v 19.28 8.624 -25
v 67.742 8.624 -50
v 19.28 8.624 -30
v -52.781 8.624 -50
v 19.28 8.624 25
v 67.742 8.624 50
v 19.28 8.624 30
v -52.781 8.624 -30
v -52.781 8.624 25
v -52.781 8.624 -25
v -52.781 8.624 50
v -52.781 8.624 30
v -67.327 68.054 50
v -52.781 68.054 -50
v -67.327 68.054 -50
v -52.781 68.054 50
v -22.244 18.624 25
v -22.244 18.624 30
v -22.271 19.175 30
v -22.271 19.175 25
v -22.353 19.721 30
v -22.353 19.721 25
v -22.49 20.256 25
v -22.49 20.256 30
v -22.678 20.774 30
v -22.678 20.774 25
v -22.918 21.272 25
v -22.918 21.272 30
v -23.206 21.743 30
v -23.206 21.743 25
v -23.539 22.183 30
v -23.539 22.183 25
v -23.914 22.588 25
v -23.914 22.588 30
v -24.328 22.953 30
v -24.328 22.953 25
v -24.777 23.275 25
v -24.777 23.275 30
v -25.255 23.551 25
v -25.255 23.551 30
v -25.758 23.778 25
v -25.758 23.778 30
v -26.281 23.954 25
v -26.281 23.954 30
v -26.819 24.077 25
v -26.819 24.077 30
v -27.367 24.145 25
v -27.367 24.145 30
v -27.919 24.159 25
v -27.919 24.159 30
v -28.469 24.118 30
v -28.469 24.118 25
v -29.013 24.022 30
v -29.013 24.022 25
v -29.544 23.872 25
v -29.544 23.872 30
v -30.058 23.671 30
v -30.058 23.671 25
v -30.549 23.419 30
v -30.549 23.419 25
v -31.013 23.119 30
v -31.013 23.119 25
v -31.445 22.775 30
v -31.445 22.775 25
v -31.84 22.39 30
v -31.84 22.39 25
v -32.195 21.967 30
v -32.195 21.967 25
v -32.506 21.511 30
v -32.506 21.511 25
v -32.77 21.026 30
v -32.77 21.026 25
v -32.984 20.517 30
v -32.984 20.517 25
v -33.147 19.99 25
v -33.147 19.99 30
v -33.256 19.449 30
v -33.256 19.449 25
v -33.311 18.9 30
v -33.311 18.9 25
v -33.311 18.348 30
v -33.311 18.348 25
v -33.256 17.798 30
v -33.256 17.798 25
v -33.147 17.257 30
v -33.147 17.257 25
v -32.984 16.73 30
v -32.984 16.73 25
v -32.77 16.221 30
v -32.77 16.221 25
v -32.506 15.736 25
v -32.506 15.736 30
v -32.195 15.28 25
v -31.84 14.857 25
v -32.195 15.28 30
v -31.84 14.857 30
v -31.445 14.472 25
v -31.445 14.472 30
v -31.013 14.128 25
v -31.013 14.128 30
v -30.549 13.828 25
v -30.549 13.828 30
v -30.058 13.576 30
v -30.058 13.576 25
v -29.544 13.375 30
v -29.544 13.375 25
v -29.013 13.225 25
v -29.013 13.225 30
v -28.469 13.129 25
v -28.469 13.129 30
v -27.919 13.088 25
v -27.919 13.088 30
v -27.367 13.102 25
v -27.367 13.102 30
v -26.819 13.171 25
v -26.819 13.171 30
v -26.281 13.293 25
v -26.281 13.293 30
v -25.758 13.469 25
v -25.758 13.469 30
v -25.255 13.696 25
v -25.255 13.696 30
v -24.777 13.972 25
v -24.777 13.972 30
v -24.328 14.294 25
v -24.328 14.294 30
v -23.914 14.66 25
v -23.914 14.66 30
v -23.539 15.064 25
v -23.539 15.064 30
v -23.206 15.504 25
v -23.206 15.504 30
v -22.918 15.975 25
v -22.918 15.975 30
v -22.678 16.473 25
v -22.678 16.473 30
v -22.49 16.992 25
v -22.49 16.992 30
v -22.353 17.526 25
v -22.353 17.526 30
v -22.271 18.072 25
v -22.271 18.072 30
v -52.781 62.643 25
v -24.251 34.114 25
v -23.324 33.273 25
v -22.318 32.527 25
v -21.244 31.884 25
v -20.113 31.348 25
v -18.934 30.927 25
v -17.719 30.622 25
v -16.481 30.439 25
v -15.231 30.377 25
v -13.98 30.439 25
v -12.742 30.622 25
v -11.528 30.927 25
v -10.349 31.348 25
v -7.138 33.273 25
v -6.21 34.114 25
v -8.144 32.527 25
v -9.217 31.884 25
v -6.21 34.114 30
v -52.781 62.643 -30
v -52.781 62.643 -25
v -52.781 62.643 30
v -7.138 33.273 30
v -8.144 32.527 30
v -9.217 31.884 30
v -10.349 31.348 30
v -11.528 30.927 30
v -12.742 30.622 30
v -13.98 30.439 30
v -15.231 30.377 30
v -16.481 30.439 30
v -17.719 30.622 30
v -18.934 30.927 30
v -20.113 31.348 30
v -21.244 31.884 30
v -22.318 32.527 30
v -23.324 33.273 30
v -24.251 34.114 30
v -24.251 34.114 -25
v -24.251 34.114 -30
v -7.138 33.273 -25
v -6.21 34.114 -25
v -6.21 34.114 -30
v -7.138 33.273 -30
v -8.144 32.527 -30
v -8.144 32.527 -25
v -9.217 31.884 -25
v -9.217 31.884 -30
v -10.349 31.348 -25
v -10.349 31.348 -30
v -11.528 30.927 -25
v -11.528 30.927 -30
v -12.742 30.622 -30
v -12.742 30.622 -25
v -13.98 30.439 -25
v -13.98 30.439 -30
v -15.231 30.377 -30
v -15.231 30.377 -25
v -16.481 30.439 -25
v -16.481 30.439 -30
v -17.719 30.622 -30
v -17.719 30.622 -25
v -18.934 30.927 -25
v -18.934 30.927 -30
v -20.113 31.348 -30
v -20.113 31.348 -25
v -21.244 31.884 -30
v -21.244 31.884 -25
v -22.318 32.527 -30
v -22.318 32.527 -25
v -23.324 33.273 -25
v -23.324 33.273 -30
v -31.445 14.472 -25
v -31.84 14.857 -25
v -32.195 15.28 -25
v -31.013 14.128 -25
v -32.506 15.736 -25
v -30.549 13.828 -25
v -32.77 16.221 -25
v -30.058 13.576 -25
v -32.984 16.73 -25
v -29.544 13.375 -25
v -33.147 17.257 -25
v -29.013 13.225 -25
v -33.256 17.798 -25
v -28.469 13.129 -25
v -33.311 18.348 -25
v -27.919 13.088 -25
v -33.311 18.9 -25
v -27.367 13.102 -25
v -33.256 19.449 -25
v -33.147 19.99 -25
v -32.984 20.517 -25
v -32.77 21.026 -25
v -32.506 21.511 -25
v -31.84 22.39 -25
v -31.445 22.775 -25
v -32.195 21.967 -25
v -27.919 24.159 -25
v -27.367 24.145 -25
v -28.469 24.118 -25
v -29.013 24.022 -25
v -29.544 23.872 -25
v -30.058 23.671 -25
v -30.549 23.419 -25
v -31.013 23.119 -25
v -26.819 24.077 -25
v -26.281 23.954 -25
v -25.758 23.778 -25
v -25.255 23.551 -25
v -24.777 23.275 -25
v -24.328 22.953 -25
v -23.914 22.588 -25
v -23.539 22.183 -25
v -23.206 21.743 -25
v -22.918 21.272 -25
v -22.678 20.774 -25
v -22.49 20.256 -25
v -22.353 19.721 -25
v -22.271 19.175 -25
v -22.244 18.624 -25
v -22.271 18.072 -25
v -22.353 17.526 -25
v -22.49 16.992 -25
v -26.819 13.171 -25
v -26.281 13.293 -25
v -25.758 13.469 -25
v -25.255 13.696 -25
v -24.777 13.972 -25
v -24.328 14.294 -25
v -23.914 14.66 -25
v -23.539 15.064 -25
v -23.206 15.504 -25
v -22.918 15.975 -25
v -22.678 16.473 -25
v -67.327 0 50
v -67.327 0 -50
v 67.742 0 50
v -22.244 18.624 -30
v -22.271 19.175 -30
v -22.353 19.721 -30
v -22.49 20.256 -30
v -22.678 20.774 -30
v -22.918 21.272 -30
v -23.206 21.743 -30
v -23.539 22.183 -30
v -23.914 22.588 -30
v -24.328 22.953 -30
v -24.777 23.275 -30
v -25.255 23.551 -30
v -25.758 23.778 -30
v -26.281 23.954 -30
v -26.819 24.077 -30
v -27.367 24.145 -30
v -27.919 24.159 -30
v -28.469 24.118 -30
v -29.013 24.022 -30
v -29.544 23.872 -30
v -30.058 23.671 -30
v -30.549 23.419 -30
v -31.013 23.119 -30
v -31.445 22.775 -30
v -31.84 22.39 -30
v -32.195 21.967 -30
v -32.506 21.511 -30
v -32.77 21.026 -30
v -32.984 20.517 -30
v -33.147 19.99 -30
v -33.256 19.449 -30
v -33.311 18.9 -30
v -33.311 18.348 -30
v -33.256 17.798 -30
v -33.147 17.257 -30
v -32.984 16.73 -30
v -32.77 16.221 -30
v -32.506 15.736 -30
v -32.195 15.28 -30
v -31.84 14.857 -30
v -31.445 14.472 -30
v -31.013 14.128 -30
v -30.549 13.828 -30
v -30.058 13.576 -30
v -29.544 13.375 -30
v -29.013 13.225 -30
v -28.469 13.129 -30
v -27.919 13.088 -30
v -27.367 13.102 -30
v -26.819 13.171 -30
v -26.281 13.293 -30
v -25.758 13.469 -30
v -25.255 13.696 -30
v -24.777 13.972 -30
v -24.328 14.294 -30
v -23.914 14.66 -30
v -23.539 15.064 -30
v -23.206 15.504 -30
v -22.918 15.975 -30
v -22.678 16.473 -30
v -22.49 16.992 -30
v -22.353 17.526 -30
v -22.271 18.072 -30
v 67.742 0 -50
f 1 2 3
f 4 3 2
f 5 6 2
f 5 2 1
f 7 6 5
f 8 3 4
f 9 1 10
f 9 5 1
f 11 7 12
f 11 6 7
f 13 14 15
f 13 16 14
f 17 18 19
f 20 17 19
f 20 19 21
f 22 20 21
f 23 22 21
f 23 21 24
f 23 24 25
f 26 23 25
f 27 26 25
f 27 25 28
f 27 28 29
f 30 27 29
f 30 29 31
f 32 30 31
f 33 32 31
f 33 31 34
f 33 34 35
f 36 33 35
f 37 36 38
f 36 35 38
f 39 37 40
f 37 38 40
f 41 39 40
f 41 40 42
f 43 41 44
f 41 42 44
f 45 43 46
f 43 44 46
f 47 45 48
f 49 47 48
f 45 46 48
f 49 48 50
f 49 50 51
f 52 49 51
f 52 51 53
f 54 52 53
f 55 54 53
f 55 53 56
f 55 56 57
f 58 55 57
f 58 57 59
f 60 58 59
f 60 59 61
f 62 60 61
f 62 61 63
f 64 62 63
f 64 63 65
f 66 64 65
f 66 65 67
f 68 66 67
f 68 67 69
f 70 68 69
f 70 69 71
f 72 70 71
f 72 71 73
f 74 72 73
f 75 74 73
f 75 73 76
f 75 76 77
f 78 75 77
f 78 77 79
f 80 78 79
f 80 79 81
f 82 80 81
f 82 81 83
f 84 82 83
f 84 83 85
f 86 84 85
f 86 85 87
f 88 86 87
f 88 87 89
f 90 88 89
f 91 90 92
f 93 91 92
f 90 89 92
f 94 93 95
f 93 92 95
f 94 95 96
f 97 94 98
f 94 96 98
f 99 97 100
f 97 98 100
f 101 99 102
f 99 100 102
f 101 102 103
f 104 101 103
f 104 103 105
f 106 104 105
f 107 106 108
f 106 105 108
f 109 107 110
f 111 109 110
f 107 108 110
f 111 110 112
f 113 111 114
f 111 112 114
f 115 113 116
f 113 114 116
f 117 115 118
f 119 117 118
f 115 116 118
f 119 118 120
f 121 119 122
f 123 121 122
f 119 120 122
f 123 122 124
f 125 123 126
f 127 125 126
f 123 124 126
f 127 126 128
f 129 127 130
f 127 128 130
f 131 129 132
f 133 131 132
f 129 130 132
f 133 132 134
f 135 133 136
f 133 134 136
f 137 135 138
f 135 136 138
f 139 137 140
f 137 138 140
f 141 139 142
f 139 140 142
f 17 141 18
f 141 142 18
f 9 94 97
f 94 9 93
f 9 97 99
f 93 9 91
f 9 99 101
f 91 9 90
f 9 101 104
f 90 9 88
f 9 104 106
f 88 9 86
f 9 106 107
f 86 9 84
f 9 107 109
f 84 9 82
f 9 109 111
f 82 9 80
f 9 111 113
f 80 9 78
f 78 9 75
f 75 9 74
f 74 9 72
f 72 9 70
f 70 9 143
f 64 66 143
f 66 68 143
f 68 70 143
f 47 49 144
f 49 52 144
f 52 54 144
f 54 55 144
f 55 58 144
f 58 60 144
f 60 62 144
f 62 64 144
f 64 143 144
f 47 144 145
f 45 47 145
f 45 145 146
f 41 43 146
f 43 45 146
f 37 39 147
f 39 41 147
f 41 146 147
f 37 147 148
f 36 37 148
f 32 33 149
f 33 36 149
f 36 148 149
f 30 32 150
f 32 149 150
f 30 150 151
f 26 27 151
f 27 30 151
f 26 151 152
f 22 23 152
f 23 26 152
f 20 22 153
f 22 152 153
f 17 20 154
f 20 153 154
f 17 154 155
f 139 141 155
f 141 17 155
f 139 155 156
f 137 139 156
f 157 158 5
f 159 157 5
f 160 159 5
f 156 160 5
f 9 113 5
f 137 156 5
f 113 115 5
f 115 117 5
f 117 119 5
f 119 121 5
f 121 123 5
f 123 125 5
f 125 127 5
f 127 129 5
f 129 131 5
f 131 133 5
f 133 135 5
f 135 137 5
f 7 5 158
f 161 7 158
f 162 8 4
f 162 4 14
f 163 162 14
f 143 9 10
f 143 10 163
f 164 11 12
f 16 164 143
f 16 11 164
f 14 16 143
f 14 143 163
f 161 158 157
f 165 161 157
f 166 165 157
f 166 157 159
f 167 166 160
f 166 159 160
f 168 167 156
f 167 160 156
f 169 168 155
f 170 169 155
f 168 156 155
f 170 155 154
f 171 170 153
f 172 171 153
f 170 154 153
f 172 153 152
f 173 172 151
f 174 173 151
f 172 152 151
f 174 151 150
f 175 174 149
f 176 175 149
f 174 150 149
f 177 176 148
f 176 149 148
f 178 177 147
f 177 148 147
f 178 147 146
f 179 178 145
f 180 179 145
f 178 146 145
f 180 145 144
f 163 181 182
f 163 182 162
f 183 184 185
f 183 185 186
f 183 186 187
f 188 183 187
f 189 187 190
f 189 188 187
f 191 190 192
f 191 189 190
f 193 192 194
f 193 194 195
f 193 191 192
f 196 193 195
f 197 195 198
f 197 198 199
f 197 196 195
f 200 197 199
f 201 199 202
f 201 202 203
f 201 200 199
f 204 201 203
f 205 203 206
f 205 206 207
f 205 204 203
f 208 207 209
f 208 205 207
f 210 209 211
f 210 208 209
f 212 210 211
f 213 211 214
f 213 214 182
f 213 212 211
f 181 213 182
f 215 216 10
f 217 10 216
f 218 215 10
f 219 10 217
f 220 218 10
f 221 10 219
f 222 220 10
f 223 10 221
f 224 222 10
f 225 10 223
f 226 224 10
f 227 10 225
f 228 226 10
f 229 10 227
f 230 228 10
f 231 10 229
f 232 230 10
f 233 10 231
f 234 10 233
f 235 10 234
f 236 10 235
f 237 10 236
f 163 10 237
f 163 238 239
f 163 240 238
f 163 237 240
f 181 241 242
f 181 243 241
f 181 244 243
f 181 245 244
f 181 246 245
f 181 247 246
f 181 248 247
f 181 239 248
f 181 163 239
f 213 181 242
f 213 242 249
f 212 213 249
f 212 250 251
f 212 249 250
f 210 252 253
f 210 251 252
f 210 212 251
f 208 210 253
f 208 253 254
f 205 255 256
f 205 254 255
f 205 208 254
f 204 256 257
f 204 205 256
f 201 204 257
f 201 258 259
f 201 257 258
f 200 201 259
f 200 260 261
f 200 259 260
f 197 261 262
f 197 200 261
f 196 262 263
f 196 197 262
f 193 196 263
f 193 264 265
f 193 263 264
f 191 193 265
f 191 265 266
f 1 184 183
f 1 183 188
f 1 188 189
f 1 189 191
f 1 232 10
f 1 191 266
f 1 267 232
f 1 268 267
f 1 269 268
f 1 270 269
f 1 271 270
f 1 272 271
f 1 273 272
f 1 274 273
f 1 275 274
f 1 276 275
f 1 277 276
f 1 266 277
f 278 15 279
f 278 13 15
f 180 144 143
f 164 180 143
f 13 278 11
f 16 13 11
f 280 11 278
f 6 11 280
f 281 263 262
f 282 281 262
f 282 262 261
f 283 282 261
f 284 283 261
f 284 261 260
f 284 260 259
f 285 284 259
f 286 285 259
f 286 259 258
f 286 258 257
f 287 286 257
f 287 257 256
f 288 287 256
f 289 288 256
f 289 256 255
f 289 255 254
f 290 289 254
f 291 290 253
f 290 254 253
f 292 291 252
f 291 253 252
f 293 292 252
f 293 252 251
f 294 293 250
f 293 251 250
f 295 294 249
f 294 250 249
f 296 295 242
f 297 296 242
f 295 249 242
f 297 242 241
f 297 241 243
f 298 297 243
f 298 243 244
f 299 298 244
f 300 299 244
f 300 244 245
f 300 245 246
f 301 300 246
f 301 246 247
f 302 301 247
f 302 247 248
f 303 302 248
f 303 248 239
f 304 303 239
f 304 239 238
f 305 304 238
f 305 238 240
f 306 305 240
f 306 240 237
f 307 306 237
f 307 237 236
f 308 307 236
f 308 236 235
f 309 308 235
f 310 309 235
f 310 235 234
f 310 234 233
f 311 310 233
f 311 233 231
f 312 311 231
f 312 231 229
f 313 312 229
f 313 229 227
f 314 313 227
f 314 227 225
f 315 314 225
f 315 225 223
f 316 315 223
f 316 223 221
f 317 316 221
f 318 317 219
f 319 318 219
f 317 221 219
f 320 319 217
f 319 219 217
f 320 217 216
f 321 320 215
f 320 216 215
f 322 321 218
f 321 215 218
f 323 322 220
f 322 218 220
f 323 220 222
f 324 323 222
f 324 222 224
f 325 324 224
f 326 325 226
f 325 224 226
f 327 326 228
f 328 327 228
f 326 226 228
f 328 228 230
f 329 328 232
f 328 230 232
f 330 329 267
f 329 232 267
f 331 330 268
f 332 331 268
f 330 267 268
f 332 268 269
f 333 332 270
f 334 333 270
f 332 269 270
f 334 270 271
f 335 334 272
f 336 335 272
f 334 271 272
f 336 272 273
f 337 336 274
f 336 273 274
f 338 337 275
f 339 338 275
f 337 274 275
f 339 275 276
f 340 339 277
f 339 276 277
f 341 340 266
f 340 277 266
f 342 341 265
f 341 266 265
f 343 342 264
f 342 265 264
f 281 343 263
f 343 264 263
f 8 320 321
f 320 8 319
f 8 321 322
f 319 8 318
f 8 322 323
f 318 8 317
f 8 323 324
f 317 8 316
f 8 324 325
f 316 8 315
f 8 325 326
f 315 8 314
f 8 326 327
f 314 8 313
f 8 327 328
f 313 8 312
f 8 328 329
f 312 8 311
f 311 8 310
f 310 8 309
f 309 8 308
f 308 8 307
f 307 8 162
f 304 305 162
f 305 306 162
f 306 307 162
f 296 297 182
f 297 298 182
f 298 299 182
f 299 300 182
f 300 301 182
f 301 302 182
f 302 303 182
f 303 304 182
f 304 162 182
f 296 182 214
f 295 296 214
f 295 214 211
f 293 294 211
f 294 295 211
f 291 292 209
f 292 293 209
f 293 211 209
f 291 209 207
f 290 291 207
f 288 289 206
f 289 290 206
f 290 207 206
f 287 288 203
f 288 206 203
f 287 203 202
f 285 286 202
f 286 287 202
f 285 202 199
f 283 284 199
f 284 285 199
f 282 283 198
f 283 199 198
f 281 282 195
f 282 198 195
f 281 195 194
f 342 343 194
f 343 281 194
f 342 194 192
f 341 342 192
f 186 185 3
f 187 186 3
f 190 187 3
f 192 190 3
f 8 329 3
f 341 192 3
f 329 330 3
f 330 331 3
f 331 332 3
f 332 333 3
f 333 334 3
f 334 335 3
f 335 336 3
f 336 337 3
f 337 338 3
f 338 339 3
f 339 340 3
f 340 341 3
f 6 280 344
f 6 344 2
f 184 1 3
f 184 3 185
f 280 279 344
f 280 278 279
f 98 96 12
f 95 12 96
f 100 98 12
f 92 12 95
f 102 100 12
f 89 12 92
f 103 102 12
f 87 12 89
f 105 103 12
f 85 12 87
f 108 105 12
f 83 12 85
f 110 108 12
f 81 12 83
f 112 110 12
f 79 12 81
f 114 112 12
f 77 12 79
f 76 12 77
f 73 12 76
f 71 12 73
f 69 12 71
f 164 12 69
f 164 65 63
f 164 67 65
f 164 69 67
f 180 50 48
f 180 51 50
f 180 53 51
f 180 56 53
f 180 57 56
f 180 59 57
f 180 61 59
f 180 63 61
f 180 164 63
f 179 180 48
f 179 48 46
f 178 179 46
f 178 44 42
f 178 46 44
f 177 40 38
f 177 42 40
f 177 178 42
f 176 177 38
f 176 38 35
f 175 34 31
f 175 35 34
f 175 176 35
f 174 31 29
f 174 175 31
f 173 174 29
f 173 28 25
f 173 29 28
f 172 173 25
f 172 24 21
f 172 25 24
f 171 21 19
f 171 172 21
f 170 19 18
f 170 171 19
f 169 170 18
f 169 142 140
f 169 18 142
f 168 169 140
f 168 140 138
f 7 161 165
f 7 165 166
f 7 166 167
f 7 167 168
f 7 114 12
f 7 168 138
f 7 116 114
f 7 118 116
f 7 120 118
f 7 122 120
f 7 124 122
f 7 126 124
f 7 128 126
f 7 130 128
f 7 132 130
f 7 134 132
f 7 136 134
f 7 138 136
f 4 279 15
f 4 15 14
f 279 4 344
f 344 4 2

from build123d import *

# Parameters (mm, degrees)
BOSS_EXTRU_1_DEPTH = 50
NERVURE1_START     = -5
NERVURE1_DEPTH     = 5
D_GAGEMENT_51_D    = 11.0744


# Read off the part's stored shape, not the designer's step: Nervure1
with BuildPart() as part:
    # Esquisse1 → Boss.-Extru.1 (new, symmetric)
    with BuildSketch(Plane.XY):
        Polygon((-67.326566733, 0), (67.742162824, 0), (67.742162824, 8.623618887), (-52.78070355, 8.623618887), (-52.78070355, 68.053859892), (-67.326566733, 68.053859892), align=None)
    extrude(amount=BOSS_EXTRU_1_DEPTH, both=True)

    # Nervure1 outline → Nervure1 (add)
    with BuildSketch(Plane.XY.offset(30).offset(NERVURE1_START)):
        with BuildLine():
            Line((19.279550654, 8.623618887), (-6.210494082, 34.113663623))
            ThreePointArc((-6.210494082, 34.113663623), (-15.230796531, 30.377332012), (-24.251098981, 34.113663623))
            Line((-24.251098981, 34.113663623), (-52.78070355, 62.643268192))
            Line((-52.78070355, 62.643268192), (-52.78070355, 8.623618887))
            Line((-52.78070355, 8.623618887), (19.279550654, 8.623618887))
        make_face()
    nervure1 = extrude(amount=NERVURE1_DEPTH)

    # Symétrie1: Nervure1 across plane
    add(nervure1.mirror(Plane.XY))

    # Dégagement #51 (through all)
    with Locations(Plane(origin=(0, 0, -30), x_dir=(-1, 0, 0), z_dir=(0, 0, -1))):
        with Locations((27.78070355, 18.623618887)):
            Hole(D_GAGEMENT_51_D / 2)


solid = part.part
